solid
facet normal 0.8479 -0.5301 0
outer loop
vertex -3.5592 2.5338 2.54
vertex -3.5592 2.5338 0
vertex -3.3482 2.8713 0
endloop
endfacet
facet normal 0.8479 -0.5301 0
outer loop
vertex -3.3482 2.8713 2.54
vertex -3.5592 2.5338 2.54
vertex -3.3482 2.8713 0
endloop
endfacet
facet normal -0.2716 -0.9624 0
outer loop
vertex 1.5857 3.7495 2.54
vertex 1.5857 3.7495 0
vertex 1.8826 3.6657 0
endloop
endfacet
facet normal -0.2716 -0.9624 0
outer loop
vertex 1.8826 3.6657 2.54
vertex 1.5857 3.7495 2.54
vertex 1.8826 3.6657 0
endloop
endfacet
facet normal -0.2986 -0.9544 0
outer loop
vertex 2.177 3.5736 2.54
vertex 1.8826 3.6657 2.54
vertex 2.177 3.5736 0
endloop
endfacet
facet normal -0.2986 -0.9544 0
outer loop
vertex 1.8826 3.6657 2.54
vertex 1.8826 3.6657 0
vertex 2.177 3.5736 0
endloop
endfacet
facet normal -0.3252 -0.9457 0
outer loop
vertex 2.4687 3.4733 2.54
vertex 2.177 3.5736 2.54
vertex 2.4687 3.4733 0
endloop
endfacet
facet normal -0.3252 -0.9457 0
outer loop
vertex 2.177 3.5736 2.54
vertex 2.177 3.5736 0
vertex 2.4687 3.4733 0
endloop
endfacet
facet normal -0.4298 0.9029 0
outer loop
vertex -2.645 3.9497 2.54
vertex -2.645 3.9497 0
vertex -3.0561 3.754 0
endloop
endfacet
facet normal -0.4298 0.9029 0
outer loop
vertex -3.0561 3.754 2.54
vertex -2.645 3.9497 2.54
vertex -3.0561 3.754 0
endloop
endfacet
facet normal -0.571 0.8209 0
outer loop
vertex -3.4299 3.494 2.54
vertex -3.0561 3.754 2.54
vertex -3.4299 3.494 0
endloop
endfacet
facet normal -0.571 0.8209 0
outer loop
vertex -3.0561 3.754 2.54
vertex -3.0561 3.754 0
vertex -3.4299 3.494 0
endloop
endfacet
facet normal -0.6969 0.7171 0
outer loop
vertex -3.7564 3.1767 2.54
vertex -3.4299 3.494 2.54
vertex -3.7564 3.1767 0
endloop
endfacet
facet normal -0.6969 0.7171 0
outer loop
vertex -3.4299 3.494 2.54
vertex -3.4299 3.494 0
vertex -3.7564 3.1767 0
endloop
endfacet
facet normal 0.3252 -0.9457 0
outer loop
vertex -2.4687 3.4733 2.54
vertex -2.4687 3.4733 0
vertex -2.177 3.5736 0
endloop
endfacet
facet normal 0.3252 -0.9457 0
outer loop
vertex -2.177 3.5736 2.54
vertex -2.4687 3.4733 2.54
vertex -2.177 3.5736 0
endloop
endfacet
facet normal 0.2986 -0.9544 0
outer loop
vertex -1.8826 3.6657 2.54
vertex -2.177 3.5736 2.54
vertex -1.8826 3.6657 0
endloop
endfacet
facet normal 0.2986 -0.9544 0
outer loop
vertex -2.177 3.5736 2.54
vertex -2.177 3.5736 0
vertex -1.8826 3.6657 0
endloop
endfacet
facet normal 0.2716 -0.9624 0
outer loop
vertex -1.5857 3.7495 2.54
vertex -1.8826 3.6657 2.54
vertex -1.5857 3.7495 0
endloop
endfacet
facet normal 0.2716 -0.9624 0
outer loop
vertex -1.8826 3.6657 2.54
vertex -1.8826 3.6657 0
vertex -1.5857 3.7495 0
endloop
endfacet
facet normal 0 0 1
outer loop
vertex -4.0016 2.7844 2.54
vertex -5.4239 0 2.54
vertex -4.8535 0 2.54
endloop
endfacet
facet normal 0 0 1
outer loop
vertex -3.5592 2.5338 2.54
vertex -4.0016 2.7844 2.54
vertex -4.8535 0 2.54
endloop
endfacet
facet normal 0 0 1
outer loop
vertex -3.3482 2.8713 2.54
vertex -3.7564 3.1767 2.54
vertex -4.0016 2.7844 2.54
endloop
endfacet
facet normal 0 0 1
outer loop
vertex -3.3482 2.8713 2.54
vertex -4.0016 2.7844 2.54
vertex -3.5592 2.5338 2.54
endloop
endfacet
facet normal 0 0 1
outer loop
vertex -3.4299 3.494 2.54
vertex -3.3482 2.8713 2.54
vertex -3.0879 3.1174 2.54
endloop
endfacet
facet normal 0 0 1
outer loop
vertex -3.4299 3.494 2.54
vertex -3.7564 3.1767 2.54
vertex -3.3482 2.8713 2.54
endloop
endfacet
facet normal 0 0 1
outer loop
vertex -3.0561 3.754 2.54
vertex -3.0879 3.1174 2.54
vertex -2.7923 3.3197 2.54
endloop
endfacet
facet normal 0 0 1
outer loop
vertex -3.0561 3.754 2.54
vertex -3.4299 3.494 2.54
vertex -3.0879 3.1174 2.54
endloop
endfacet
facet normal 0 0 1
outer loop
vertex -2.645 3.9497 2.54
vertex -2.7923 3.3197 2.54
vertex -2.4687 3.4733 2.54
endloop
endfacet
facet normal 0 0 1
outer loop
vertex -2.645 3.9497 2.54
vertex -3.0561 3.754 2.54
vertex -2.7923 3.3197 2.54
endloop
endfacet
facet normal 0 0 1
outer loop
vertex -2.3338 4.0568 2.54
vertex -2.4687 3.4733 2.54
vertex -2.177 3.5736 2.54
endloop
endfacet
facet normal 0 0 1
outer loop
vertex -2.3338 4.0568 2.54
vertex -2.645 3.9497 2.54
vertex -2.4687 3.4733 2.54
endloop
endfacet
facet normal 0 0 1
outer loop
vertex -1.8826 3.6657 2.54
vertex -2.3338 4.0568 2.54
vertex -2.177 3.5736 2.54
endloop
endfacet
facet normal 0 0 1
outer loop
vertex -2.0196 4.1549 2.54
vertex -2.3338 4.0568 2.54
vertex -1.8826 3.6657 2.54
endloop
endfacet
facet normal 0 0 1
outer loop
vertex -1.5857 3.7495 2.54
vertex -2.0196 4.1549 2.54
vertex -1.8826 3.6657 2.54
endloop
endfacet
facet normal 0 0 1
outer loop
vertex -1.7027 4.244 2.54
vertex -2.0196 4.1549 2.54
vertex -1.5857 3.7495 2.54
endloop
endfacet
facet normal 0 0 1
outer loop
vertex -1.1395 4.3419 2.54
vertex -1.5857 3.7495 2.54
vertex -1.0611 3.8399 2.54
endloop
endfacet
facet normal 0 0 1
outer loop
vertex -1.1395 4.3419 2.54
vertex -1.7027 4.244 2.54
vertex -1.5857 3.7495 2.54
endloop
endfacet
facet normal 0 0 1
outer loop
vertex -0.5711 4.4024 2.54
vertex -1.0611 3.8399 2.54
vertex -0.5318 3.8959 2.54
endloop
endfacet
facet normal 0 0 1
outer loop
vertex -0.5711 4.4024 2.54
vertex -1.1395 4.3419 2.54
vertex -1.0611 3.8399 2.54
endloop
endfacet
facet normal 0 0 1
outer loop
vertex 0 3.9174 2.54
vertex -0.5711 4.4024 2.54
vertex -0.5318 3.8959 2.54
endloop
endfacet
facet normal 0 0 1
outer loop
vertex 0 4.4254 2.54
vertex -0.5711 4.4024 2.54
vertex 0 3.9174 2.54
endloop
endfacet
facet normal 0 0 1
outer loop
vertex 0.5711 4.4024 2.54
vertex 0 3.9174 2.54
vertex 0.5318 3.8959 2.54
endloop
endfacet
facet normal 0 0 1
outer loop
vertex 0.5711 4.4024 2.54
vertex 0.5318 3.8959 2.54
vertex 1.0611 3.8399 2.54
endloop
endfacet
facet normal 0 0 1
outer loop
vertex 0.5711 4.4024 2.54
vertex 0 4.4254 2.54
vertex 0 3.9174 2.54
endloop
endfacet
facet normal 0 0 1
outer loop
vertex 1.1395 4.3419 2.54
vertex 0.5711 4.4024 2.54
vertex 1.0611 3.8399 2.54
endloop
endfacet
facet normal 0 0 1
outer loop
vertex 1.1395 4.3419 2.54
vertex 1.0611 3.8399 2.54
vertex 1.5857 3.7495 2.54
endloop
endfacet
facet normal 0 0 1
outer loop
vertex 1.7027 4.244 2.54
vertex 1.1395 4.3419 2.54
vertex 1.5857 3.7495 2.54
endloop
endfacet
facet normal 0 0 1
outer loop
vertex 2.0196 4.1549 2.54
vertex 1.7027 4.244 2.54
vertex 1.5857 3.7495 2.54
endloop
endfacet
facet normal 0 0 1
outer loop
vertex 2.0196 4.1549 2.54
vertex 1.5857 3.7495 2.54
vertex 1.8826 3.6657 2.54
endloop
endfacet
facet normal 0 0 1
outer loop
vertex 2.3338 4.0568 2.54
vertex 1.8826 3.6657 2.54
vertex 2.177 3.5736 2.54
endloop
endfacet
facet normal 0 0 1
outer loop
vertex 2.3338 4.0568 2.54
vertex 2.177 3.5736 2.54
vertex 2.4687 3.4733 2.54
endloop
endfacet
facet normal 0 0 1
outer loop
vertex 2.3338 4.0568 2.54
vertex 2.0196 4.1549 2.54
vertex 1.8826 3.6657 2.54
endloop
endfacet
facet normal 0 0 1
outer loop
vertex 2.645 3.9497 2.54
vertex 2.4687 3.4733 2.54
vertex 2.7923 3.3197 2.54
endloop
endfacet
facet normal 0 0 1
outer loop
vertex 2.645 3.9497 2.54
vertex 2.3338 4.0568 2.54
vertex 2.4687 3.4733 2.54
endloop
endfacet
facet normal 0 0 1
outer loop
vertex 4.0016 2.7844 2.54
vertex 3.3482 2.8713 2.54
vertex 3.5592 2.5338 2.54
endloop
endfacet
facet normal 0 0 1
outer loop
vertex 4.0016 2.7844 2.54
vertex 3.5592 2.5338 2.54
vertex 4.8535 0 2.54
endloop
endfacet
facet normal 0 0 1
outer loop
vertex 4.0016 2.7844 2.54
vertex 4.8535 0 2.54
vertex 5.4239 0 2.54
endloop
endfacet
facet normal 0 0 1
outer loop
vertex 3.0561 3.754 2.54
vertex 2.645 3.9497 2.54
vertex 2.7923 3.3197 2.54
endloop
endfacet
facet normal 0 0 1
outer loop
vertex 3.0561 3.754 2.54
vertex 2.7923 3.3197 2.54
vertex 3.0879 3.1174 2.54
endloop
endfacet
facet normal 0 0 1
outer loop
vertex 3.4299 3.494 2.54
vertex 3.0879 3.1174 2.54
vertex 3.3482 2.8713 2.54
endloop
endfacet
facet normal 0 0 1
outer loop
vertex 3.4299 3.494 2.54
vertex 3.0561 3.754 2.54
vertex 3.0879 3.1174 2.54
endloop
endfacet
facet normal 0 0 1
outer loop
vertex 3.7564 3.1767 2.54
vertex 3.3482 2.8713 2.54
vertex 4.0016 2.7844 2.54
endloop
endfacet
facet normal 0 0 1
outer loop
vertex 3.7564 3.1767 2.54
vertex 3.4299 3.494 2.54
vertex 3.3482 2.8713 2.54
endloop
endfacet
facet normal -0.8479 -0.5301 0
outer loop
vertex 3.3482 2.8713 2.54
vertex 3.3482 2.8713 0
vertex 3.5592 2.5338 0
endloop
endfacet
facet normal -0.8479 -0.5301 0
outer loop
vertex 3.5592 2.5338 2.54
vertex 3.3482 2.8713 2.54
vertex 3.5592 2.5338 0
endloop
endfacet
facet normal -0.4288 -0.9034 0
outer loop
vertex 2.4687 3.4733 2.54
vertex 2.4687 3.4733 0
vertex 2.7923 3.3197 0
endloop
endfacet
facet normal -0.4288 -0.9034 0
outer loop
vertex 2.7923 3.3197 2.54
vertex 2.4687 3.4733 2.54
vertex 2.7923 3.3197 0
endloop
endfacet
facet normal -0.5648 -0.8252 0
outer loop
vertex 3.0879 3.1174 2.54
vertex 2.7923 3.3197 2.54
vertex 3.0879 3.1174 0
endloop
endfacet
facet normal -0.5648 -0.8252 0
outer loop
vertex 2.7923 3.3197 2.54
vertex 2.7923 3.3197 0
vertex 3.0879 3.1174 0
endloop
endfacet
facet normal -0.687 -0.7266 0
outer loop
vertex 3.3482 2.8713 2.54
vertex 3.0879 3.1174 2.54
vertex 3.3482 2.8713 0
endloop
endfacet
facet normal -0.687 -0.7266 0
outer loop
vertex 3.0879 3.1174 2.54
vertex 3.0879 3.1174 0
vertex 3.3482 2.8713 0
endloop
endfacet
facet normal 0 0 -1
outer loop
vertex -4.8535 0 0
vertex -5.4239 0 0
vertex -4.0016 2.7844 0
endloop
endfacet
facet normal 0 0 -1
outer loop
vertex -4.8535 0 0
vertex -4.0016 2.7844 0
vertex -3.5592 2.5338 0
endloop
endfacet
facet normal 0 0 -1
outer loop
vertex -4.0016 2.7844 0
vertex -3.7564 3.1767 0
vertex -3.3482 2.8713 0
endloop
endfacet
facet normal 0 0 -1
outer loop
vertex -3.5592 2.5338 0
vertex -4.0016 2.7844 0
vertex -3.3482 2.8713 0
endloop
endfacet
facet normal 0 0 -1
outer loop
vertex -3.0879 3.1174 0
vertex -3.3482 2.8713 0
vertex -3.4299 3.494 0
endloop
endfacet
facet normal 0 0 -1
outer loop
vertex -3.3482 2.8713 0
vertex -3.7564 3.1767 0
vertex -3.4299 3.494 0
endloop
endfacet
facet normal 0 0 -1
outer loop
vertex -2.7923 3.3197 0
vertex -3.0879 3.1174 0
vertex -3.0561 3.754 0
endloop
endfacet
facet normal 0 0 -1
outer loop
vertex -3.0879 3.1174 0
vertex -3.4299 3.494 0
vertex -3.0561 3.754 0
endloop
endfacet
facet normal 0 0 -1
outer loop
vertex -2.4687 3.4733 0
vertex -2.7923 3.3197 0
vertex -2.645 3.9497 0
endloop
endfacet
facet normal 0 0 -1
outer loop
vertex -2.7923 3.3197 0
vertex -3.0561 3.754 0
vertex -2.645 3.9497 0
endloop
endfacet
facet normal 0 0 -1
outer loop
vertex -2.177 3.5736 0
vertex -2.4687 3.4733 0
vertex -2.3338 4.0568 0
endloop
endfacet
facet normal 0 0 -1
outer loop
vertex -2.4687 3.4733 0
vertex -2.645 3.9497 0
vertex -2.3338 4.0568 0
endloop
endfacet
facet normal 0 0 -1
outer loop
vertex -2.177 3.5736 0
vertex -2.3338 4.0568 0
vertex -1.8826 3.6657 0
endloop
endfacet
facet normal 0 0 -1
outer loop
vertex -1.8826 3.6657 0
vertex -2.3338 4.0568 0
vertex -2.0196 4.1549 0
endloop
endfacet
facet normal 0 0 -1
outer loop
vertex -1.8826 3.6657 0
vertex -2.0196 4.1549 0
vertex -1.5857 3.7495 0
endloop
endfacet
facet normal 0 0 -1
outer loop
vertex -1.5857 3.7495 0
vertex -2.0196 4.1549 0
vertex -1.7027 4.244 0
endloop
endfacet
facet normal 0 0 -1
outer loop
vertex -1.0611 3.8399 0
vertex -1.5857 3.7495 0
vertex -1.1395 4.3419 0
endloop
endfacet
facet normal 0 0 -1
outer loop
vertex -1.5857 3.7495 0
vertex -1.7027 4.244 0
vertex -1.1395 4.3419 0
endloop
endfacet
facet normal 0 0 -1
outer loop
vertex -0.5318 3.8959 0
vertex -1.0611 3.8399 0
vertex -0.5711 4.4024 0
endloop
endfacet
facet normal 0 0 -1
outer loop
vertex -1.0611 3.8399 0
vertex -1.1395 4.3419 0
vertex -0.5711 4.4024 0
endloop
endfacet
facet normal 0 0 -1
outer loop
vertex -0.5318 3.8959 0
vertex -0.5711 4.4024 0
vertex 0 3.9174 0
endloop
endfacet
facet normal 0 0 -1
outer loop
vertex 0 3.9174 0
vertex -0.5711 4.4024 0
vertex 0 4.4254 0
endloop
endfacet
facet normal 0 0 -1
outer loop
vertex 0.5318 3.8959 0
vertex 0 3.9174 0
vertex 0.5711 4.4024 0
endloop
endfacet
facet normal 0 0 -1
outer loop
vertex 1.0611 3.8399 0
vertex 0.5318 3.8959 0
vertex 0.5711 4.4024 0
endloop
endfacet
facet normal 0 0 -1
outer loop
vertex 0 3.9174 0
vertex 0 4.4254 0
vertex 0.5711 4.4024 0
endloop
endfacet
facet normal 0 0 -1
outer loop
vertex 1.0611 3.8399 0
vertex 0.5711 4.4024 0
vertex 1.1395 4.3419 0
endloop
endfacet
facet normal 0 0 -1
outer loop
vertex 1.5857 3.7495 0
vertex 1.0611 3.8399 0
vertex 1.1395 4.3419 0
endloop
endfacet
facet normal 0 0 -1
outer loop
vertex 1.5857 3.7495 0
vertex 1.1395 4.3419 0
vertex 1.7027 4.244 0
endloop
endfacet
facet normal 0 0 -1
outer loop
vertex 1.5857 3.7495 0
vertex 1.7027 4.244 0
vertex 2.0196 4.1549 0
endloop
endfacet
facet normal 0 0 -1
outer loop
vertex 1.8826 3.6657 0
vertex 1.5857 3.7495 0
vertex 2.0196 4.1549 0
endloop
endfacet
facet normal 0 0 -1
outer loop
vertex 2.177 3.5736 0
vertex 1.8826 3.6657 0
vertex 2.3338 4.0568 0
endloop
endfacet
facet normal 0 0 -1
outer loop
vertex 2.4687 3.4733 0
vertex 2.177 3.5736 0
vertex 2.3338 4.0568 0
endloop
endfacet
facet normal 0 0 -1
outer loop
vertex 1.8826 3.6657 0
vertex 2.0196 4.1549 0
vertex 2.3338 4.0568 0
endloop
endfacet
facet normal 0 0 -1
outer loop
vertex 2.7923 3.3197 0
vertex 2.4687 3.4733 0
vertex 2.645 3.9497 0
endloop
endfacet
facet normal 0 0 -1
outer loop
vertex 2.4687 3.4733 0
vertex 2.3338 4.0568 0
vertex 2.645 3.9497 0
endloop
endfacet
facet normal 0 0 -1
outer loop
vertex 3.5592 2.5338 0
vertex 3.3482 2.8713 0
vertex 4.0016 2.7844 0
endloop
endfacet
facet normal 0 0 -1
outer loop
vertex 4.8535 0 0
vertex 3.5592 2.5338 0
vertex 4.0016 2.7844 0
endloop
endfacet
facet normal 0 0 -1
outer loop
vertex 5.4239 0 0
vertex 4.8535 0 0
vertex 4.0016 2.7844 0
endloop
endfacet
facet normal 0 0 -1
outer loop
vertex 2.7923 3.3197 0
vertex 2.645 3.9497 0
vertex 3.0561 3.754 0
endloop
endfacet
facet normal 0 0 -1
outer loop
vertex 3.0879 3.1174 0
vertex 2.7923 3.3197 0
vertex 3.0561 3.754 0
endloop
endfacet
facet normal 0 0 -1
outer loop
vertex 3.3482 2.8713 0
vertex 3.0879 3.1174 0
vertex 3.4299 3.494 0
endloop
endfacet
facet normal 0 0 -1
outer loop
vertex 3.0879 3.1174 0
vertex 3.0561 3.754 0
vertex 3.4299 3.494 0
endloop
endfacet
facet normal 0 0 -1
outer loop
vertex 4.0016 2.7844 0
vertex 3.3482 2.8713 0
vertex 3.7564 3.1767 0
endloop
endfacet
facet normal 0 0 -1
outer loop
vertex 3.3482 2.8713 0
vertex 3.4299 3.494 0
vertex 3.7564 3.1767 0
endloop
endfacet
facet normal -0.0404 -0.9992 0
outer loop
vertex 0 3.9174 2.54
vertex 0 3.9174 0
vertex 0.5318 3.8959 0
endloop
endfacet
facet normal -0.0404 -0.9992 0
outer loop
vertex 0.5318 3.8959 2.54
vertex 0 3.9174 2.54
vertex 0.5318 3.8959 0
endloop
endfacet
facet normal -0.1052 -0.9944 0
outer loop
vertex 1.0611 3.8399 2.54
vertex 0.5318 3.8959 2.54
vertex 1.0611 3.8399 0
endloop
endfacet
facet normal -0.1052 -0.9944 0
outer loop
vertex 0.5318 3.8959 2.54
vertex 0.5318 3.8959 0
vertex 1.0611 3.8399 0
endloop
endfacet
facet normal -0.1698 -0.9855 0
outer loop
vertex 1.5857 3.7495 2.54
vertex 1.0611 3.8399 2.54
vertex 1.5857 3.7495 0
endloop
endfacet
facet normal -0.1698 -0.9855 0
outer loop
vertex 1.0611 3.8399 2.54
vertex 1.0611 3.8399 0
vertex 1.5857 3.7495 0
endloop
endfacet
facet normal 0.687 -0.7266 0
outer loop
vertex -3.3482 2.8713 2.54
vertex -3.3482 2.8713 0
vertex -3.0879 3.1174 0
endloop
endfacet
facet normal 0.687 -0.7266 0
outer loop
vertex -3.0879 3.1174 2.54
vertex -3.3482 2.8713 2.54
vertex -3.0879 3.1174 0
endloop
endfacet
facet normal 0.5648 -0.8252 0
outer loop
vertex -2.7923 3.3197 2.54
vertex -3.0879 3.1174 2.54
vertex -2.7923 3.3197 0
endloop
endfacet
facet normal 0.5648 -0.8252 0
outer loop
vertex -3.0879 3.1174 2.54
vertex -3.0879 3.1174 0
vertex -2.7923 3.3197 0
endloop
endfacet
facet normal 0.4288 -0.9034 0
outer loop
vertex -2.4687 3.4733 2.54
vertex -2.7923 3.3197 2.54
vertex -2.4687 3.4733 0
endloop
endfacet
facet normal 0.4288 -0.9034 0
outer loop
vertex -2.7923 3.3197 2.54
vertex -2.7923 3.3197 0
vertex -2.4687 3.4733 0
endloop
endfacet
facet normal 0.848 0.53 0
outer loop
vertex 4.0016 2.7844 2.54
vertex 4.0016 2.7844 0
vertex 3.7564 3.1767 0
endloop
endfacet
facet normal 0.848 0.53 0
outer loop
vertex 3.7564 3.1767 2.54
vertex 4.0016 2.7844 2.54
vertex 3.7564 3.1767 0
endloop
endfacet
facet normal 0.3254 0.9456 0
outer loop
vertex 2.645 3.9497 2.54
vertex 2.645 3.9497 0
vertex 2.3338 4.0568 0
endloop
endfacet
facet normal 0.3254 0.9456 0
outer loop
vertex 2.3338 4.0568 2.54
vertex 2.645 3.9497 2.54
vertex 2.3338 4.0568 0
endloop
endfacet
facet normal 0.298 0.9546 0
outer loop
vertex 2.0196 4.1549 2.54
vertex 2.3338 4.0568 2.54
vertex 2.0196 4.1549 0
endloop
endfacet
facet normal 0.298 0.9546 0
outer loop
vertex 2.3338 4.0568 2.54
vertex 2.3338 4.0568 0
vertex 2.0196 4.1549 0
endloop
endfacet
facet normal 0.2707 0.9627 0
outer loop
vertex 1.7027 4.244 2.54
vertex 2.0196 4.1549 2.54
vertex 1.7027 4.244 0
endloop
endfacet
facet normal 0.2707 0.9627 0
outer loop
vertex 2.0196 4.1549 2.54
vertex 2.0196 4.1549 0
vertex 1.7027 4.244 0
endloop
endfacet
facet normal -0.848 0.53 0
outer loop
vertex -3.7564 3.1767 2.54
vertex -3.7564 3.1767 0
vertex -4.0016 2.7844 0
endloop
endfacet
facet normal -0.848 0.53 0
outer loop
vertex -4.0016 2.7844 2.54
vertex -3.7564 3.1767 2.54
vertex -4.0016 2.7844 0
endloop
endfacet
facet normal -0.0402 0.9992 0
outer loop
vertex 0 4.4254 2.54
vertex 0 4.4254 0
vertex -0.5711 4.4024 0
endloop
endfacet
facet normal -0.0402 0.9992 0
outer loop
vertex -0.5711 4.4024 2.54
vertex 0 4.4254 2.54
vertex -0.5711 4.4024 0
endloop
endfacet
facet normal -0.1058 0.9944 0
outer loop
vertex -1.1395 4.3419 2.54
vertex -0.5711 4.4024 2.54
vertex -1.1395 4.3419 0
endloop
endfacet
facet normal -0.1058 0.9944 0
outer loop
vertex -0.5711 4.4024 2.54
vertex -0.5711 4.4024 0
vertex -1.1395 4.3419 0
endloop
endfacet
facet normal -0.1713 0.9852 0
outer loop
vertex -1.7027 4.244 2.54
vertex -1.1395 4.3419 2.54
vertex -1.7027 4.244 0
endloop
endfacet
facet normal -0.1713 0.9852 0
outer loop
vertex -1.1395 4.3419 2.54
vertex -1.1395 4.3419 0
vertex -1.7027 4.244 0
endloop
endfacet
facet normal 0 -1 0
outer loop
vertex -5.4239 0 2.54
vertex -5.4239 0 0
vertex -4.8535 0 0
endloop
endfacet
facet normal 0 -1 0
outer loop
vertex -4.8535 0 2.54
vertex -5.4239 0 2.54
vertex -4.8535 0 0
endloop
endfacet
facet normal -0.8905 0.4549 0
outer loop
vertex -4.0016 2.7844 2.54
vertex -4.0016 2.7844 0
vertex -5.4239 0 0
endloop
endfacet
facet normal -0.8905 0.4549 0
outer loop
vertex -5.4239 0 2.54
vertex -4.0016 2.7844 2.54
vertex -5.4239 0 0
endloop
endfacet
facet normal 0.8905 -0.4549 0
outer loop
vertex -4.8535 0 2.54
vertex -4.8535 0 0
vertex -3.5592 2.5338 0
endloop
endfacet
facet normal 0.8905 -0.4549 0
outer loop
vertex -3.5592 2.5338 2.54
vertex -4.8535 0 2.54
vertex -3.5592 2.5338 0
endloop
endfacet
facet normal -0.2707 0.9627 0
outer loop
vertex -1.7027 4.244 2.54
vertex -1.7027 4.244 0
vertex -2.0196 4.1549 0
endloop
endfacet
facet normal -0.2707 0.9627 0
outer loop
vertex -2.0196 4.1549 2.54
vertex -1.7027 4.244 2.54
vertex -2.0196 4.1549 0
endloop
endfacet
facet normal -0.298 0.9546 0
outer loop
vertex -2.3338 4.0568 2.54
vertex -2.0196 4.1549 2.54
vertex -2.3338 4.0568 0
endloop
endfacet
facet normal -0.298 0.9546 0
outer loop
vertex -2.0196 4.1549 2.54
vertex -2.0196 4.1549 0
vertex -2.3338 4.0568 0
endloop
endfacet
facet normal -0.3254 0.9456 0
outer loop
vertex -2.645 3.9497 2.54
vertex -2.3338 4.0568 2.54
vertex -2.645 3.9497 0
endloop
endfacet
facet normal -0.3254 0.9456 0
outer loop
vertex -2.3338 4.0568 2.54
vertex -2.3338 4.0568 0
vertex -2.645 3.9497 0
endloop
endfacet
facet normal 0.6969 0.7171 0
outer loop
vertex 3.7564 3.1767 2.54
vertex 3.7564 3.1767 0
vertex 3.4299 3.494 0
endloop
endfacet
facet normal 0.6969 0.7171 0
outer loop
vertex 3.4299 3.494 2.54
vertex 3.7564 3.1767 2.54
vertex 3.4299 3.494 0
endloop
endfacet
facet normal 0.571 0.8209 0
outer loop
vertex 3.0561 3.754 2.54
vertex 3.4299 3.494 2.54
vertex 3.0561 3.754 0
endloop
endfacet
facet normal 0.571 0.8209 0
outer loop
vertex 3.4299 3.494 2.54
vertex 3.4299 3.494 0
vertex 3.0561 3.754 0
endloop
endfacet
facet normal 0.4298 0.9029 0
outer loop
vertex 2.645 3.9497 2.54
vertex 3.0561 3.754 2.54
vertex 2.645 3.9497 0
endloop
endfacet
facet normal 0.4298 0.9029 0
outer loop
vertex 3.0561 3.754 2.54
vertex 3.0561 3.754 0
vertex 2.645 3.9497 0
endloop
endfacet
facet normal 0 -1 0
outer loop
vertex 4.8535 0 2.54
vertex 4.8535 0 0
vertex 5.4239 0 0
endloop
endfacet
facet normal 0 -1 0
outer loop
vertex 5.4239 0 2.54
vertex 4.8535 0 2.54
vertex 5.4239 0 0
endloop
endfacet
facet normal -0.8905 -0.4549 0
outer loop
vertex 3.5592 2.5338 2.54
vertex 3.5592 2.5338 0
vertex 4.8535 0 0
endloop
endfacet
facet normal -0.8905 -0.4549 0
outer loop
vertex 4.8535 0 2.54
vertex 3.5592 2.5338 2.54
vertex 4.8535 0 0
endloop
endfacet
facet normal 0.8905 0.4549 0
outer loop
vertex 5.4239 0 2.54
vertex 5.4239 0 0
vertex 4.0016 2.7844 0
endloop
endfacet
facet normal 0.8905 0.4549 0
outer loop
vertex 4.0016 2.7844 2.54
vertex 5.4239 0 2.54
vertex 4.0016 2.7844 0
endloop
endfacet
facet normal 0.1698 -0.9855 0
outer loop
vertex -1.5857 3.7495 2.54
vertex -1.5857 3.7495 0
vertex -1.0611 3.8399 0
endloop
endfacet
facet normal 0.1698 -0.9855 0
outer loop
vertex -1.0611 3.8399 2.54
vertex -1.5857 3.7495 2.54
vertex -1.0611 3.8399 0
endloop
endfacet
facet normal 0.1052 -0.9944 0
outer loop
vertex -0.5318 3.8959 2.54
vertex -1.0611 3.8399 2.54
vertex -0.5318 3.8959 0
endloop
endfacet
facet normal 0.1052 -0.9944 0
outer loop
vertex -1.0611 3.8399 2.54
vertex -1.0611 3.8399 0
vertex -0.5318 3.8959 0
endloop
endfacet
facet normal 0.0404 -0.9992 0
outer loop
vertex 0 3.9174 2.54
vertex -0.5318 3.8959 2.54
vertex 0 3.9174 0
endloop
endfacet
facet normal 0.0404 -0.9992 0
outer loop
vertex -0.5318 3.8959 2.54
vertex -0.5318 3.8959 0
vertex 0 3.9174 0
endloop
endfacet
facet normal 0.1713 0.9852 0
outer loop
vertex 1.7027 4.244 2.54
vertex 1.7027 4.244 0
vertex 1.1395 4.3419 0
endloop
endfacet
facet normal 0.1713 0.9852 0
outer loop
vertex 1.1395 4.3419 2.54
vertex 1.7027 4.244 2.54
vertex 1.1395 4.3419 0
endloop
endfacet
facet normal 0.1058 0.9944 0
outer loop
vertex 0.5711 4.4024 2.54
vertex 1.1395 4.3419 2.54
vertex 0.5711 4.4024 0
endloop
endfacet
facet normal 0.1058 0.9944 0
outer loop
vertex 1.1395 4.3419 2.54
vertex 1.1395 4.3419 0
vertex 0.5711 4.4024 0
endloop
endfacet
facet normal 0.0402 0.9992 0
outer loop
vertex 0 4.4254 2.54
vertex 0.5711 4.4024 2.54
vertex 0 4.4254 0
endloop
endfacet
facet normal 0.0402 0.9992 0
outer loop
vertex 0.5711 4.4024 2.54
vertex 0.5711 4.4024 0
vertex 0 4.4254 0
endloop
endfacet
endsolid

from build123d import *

# Parameters (mm, degrees)
BOSS_EXTRUDE1_DEPTH = 2.54


with BuildPart() as part:
    # Sketch1 → Boss-Extrude1 (new body)
    with BuildSketch(Plane.XY):
        with BuildLine():
            Line((-4.853491174, 0), (-3.559199198, 2.53375457))
            Line((-3.559199198, 2.53375457), (-3.348230277, 2.871336194))
            ThreePointArc((-3.348230277, 2.871336194), (-2.944103246, 3.224381504), (-2.468700609, 3.473283052))
            ThreePointArc((-2.468700609, 3.473283052), (-2.030100497, 3.620676512), (-1.585680864, 3.749463464))
            ThreePointArc((-1.585680864, 3.749463464), (-0.796949472, 3.872230469), (0, 3.917402206))
            ThreePointArc((0, 3.917402206), (0.796949472, 3.872230469), (1.585680864, 3.749463464))
            ThreePointArc((1.585680864, 3.749463464), (2.030100497, 3.620676512), (2.468700609, 3.473283052))
            ThreePointArc((2.468700609, 3.473283052), (2.944103246, 3.224381504), (3.348230277, 2.871336194))
            Line((3.348230277, 2.871336194), (3.559199198, 2.53375457))
            Line((3.559199198, 2.53375457), (4.853491174, 0))
            Line((4.853491174, 0), (5.423931714, 0))
            Line((5.423931714, 0), (4.00161657, 2.78437753))
            Line((4.00161657, 2.78437753), (3.756428721, 3.176714524))
            ThreePointArc((3.756428721, 3.176714524), (3.248333968, 3.631652605), (2.64503979, 3.949717174))
            ThreePointArc((2.64503979, 3.949717174), (2.177010777, 4.106994166), (1.702656867, 4.244018167))
            ThreePointArc((1.702656867, 4.244018167), (0.855815628, 4.376835426), (0, 4.425416473))
            ThreePointArc((0, 4.425416473), (-0.855815628, 4.376835426), (-1.702656867, 4.244018167))
            ThreePointArc((-1.702656867, 4.244018167), (-2.177010777, 4.106994166), (-2.64503979, 3.949717174))
            ThreePointArc((-2.64503979, 3.949717174), (-3.248333968, 3.631652605), (-3.756428721, 3.176714524))
            Line((-3.756428721, 3.176714524), (-4.00161657, 2.78437753))
            Line((-4.00161657, 2.78437753), (-5.423931714, 0))
            Line((-5.423931714, 0), (-4.853491174, 0))
        make_face()
    extrude(amount=BOSS_EXTRUDE1_DEPTH)


solid = part.part
